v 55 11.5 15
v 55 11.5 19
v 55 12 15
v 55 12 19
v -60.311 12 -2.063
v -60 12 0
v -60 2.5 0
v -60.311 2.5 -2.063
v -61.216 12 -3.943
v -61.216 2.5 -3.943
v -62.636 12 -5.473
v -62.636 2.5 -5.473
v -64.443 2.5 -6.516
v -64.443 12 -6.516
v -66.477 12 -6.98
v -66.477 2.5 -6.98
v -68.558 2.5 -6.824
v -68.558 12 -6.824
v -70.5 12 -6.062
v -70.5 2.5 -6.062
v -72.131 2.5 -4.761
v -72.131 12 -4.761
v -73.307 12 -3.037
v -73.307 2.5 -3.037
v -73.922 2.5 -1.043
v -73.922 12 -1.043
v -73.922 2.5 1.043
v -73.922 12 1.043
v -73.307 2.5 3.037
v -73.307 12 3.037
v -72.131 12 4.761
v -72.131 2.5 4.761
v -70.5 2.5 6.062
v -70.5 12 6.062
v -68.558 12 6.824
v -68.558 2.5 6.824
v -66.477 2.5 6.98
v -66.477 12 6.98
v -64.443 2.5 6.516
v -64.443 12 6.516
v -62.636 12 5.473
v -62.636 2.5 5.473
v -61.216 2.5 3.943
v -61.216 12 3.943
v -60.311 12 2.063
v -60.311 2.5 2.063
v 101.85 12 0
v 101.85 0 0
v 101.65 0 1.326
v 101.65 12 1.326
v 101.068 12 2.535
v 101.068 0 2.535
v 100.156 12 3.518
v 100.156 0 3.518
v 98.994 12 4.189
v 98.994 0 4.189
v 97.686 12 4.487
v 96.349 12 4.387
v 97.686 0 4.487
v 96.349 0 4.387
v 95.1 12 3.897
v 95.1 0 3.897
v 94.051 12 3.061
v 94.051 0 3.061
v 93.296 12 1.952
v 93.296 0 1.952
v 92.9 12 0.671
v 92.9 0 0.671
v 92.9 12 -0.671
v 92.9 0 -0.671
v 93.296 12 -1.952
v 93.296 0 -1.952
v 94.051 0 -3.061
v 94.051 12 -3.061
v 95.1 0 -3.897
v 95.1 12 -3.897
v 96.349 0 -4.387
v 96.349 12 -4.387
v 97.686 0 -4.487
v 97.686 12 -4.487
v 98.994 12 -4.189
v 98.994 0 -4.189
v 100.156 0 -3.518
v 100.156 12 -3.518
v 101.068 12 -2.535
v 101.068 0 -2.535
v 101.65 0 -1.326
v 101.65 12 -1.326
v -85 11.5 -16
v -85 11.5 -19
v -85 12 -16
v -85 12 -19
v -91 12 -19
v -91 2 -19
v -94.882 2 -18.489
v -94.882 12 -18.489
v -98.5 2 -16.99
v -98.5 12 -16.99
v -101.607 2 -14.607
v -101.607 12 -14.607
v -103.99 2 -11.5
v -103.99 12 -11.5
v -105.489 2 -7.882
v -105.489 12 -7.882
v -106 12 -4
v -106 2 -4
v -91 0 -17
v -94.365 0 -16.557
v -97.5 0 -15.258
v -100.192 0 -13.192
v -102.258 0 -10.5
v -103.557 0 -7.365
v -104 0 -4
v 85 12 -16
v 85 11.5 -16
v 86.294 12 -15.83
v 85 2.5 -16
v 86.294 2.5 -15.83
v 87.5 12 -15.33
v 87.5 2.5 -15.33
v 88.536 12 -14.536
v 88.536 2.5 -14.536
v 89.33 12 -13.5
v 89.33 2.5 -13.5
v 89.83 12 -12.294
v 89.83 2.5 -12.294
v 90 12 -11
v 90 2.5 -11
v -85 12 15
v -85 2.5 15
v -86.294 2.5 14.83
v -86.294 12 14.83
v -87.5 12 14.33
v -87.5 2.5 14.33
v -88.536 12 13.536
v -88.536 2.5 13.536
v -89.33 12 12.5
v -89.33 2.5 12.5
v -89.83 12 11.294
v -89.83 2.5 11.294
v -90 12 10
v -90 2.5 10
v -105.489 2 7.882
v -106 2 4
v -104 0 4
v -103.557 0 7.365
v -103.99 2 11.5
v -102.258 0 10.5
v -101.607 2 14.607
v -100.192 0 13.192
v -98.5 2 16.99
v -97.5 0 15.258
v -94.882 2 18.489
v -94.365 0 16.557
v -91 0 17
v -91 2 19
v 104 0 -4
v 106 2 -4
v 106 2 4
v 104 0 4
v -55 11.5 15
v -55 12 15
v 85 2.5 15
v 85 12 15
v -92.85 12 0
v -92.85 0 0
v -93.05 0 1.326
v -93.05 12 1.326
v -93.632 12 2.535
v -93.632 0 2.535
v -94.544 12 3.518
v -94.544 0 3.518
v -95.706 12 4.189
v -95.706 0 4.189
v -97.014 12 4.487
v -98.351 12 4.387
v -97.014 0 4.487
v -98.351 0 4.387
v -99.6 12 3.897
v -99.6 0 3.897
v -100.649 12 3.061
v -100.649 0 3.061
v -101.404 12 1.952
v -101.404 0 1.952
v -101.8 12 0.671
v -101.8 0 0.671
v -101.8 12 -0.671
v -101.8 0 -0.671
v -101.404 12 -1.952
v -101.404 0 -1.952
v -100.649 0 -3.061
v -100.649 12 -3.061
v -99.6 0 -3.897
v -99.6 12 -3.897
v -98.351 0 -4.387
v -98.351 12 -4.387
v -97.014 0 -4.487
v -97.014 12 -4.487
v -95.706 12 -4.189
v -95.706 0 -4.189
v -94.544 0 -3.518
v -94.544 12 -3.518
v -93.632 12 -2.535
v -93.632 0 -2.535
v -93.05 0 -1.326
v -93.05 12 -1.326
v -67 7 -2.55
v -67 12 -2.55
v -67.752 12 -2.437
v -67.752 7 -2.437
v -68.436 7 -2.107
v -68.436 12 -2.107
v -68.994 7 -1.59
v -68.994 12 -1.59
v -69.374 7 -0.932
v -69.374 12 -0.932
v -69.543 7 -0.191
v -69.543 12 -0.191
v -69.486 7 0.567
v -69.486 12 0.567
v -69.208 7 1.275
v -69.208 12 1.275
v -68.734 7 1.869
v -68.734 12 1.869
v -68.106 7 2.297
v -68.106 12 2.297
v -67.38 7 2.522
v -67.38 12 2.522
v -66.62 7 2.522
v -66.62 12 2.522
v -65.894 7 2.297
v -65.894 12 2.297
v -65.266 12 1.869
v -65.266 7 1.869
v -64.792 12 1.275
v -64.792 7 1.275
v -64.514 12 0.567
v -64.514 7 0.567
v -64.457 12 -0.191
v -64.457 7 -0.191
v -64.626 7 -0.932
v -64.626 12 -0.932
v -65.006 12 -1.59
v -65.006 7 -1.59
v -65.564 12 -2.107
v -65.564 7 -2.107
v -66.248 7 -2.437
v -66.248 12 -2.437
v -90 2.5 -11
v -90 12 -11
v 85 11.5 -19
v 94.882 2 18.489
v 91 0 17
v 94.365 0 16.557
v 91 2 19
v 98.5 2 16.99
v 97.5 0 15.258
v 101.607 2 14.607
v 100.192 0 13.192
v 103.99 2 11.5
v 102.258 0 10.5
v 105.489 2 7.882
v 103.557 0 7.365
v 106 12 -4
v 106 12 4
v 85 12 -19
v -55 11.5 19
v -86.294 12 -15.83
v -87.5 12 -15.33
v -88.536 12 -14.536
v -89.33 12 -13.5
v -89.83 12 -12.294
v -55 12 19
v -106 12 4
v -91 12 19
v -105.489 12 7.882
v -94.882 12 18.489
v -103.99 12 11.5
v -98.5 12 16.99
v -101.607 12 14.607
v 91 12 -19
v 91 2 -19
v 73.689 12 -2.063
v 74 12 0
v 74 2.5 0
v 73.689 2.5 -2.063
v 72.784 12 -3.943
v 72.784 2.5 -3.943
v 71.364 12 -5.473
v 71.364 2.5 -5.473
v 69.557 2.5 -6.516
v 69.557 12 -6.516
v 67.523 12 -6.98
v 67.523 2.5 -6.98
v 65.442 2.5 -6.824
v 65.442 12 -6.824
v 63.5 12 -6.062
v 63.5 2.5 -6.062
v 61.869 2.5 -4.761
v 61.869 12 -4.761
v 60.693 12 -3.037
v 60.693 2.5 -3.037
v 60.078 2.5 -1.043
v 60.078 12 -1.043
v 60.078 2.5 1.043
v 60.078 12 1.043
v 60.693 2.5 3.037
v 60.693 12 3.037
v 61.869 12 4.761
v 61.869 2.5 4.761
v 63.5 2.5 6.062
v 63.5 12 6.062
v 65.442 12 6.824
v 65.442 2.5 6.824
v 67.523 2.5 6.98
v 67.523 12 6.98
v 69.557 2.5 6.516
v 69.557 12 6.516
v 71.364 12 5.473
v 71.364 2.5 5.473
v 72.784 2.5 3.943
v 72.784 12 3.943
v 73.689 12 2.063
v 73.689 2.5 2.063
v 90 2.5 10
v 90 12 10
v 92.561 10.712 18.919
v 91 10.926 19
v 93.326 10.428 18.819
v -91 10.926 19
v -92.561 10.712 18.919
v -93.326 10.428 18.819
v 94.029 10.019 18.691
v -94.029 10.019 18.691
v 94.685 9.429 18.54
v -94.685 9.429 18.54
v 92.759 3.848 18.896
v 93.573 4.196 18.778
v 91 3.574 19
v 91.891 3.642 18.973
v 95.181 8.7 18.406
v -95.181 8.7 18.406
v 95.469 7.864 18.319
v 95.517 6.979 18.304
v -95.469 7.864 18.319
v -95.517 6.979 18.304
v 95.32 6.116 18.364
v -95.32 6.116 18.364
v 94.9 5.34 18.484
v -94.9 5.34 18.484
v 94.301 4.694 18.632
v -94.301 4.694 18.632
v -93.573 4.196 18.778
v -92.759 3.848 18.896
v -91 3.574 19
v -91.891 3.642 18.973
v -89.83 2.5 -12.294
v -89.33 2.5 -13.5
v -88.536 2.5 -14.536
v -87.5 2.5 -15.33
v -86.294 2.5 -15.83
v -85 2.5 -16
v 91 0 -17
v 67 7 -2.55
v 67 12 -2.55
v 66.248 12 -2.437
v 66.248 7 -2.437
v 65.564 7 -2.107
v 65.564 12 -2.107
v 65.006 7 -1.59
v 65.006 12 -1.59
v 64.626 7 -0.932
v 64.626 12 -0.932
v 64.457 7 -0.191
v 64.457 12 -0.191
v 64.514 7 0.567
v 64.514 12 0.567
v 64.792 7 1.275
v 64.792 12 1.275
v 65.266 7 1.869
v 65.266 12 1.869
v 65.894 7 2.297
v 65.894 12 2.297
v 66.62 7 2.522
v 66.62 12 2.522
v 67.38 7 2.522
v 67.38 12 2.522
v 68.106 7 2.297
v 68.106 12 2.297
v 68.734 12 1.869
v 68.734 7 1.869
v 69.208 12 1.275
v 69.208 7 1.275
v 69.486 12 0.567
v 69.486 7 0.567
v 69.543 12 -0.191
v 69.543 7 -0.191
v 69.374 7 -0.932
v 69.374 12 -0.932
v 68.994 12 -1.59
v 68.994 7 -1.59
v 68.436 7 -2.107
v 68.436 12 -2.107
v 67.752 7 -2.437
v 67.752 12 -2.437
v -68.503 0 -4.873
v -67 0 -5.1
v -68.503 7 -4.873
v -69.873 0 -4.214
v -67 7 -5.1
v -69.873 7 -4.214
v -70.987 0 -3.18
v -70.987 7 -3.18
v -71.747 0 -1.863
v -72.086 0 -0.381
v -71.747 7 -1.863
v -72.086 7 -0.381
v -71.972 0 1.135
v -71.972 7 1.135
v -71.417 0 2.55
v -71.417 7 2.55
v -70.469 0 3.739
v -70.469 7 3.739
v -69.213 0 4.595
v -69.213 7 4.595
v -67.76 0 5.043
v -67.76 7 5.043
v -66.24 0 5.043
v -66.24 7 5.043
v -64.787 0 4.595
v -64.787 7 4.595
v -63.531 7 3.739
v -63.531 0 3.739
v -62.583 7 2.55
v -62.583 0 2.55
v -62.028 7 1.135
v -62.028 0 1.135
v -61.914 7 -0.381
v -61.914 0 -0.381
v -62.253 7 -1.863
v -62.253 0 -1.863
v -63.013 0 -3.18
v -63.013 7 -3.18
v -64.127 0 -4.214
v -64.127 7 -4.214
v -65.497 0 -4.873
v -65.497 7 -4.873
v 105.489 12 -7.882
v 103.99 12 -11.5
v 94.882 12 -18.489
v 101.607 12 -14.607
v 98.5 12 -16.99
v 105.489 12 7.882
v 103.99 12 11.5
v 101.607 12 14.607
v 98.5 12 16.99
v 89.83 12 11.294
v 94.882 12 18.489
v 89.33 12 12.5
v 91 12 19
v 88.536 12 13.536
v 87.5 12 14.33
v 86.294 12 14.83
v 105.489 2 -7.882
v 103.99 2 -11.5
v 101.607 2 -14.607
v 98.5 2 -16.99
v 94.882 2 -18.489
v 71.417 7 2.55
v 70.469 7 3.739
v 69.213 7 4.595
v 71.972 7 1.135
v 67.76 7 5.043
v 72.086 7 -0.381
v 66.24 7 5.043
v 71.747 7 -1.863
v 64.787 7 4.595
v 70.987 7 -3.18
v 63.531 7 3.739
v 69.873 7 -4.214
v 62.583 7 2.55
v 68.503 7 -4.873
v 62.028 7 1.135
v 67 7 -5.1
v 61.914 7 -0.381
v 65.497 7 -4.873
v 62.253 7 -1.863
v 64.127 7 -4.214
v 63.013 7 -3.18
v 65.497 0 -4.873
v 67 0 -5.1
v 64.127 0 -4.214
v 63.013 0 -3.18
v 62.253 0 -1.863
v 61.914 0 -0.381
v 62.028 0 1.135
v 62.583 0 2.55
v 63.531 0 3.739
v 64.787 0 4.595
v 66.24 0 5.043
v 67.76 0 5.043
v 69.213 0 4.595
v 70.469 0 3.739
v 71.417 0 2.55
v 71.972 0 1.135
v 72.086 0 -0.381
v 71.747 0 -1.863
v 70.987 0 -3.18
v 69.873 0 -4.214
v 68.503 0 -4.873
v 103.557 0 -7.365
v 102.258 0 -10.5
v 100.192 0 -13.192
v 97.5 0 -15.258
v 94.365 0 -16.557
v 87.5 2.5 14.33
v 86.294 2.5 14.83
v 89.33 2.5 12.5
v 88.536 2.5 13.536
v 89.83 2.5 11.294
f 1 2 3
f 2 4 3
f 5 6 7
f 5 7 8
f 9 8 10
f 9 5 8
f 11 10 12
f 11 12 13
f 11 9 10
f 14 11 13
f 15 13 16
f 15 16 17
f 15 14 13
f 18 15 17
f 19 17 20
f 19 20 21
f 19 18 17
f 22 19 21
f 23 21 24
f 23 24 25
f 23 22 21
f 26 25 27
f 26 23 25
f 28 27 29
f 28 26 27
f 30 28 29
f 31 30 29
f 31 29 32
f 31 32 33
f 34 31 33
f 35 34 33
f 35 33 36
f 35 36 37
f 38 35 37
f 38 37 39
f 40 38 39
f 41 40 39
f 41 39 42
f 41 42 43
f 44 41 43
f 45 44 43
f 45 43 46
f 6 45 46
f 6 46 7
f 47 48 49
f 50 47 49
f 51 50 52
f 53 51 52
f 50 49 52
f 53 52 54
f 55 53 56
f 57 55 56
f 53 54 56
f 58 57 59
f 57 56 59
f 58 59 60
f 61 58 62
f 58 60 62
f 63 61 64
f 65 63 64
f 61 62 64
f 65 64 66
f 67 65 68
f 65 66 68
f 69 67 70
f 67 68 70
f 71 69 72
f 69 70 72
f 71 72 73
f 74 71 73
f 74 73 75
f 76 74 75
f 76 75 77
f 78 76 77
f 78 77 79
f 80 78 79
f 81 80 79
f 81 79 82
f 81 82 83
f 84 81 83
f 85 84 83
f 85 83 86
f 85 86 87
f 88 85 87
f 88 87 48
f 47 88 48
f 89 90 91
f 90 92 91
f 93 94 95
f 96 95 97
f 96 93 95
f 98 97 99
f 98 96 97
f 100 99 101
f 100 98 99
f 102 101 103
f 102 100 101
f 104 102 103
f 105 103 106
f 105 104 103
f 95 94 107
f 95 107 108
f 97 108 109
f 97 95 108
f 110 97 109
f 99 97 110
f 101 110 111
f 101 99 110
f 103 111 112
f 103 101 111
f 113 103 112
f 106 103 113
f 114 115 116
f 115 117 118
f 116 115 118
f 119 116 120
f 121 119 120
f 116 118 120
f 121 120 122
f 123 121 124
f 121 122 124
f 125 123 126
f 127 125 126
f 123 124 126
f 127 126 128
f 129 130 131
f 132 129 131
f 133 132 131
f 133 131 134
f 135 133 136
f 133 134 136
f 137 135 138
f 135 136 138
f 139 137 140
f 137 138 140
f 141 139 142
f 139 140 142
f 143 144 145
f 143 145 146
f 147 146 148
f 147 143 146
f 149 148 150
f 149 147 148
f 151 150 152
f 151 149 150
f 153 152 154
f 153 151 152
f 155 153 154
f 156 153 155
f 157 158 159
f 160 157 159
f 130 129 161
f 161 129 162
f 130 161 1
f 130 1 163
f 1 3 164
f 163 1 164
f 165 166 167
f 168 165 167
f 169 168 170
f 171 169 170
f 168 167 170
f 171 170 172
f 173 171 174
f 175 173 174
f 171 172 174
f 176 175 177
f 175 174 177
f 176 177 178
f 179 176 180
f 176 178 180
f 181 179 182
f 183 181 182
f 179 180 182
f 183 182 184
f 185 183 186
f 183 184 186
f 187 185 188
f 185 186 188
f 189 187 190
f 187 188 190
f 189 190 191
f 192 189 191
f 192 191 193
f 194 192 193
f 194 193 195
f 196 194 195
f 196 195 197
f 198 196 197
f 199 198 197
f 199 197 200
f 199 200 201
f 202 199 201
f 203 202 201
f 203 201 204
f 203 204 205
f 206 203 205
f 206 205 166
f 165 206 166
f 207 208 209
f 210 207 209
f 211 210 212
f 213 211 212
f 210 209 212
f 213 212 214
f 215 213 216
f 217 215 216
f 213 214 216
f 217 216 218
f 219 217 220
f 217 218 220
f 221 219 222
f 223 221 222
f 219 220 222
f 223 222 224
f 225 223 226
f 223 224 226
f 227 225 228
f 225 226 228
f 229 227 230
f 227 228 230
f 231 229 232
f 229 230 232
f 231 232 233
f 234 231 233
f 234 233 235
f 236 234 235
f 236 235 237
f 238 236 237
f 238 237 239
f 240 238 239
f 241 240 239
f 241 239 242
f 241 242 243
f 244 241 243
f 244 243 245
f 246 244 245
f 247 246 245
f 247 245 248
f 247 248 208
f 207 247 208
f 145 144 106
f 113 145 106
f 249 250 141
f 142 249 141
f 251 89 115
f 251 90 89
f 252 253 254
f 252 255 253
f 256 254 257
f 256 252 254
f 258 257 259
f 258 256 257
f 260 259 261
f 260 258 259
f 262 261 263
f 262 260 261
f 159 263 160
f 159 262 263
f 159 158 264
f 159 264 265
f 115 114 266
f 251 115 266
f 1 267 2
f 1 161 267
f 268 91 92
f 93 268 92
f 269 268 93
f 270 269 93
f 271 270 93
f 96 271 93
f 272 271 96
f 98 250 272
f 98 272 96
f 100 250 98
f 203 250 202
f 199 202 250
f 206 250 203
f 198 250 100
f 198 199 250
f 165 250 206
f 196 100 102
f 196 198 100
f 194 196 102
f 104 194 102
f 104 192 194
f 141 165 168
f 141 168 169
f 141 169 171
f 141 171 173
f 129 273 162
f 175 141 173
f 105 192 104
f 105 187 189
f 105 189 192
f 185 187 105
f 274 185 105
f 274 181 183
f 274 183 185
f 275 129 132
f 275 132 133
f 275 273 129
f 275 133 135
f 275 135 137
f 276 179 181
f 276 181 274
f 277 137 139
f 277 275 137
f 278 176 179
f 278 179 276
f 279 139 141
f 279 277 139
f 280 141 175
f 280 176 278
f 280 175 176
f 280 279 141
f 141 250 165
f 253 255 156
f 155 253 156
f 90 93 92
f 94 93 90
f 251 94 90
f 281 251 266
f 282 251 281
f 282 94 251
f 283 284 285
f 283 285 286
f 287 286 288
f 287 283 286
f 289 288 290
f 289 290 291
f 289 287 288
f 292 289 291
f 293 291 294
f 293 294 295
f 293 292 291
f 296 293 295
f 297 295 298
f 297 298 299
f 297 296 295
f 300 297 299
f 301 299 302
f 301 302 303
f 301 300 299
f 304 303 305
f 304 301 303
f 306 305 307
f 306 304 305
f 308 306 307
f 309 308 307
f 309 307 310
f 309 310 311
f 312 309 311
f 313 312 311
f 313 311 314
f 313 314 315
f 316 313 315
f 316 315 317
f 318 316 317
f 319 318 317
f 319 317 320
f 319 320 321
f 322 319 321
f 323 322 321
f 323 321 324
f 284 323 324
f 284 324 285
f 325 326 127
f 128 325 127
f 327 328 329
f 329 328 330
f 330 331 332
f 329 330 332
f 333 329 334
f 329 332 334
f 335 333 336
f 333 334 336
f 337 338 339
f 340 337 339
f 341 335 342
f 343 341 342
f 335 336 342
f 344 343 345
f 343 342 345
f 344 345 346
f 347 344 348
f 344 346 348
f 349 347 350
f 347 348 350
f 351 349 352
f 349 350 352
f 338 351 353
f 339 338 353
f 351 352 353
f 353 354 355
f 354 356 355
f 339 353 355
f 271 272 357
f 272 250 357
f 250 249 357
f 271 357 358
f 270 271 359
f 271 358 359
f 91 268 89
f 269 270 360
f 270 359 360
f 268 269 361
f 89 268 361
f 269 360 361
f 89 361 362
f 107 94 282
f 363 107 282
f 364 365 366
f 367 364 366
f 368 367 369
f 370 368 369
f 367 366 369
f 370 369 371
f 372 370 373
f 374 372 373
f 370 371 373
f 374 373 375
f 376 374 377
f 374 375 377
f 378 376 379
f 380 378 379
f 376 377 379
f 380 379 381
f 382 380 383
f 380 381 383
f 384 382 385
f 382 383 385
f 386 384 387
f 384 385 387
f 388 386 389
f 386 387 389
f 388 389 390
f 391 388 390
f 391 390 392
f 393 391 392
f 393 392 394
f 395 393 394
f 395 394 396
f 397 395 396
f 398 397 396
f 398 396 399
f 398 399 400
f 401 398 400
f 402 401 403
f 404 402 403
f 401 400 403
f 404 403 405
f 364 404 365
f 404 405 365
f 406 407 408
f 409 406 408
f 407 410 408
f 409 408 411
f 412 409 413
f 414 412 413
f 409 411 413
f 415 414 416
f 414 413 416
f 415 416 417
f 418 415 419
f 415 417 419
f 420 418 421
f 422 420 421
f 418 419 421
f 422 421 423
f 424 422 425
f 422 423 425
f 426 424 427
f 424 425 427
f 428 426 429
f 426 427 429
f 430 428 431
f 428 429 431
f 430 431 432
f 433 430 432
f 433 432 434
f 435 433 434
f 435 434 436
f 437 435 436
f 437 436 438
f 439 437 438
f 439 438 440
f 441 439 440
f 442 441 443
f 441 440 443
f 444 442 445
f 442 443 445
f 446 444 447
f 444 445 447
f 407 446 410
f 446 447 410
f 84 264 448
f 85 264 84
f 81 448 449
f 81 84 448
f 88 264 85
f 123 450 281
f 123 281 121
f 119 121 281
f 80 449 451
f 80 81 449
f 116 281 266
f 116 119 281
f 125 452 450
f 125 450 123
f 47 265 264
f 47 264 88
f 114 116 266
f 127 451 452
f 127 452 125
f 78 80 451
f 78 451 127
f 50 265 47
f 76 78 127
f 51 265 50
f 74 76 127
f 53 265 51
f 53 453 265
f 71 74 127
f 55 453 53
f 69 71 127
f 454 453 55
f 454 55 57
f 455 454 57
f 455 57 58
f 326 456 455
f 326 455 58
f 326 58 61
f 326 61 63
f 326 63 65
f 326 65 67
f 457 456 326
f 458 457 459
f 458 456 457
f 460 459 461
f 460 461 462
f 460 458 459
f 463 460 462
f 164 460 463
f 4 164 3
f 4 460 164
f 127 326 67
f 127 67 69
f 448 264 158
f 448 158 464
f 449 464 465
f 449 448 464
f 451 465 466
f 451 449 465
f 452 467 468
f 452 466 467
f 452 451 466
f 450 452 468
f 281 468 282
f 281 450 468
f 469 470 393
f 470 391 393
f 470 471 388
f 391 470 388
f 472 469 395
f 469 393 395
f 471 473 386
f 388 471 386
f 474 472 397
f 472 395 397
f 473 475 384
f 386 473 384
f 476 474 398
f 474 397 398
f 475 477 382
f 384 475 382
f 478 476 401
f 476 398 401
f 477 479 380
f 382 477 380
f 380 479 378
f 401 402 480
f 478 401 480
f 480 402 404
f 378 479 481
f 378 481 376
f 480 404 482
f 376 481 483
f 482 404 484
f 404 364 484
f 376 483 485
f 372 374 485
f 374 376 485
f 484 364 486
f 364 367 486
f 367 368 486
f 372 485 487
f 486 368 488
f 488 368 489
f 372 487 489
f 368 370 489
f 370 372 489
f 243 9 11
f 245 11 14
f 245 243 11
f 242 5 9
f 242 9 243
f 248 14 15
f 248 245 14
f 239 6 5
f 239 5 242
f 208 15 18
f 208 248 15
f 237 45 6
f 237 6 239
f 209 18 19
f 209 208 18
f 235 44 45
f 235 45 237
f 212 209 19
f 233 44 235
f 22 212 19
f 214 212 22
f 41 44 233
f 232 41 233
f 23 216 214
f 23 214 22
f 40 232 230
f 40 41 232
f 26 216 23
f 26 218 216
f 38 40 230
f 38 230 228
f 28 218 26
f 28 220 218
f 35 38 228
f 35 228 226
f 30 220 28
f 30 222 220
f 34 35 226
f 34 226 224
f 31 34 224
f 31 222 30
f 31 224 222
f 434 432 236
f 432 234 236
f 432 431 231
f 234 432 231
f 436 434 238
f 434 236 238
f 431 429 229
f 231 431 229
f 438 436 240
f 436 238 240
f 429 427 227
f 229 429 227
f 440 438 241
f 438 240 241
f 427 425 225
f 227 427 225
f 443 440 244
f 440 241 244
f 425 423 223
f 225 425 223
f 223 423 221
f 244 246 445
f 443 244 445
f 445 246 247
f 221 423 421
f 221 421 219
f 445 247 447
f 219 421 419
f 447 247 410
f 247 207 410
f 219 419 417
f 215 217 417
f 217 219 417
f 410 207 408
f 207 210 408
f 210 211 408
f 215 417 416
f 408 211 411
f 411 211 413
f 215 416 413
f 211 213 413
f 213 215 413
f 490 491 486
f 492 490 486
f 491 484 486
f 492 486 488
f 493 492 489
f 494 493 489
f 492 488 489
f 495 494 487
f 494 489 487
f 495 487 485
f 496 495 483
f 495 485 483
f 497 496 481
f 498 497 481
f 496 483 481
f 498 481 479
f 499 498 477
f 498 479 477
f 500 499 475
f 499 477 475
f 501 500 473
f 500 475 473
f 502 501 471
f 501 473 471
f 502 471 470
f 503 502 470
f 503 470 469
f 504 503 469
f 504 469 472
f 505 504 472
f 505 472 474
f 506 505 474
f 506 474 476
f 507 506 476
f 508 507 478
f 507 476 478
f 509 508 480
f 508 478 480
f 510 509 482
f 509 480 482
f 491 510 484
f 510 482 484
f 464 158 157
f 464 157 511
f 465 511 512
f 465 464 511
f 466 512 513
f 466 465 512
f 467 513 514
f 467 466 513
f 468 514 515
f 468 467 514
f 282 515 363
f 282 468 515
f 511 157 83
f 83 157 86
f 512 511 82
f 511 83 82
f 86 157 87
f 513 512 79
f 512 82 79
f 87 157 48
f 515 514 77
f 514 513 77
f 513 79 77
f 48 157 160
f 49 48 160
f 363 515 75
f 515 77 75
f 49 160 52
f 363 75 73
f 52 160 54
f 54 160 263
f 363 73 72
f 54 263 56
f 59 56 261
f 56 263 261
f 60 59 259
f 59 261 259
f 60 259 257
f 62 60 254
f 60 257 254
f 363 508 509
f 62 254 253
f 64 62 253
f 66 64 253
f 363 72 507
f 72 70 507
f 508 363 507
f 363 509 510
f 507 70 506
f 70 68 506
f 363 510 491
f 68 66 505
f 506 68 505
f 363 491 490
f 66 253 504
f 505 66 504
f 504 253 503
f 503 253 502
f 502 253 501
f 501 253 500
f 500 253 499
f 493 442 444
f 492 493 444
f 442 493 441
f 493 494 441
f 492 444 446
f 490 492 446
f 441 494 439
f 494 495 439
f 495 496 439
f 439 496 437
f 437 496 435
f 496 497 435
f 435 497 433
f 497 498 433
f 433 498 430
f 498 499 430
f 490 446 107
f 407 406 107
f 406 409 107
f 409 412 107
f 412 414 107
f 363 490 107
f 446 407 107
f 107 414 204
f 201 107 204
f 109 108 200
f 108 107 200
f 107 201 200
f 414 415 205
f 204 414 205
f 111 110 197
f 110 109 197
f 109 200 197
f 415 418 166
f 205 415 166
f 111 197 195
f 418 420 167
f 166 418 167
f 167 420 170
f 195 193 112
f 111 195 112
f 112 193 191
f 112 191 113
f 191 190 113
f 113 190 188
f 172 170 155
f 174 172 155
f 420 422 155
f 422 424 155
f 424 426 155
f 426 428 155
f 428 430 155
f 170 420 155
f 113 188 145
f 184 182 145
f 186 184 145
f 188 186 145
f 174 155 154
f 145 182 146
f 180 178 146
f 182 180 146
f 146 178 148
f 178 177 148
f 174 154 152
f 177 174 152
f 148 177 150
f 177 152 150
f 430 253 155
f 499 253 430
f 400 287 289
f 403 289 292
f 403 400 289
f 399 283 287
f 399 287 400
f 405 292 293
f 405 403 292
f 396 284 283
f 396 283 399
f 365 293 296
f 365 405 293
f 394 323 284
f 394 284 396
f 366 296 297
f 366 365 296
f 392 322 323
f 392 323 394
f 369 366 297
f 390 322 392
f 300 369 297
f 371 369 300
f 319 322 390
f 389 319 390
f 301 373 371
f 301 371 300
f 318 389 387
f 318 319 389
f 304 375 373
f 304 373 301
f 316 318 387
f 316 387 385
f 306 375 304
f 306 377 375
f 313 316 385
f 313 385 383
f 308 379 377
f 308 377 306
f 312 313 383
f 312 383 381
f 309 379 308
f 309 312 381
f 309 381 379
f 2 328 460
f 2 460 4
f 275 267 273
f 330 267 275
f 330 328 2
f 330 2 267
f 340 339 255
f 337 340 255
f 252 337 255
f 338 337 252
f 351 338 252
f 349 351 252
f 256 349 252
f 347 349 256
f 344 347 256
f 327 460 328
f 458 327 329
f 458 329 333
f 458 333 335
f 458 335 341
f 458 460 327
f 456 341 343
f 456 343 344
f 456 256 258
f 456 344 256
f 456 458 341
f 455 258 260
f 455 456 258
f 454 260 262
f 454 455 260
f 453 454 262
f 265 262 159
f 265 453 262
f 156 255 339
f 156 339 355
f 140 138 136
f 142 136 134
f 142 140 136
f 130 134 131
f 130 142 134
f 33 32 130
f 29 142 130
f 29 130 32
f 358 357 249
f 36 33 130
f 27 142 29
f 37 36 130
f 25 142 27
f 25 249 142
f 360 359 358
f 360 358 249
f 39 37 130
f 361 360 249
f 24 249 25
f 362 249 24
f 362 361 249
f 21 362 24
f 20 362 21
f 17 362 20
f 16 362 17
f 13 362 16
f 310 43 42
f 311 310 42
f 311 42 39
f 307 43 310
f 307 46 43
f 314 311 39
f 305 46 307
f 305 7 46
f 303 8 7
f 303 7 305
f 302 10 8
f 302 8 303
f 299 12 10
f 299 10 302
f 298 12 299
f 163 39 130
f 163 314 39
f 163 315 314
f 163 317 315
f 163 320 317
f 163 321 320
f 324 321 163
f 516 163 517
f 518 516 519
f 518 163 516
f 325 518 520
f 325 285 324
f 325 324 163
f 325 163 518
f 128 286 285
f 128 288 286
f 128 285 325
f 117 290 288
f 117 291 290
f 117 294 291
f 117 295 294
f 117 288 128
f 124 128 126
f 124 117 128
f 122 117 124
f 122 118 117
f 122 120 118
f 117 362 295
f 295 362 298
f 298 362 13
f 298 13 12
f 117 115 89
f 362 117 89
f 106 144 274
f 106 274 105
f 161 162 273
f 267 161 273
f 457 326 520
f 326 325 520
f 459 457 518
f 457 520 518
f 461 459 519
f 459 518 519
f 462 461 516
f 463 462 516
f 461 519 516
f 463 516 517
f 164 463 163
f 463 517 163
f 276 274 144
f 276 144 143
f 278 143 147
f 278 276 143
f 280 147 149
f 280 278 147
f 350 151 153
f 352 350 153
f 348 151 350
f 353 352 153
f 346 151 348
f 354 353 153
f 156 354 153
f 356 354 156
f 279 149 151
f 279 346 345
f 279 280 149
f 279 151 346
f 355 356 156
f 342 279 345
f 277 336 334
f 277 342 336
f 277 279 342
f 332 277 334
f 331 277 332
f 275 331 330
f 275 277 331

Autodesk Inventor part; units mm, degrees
ref_plane "YZ Plane" through (0, 0, 0) normal (1, 0, 0) x (0, 1, 0)
ref_plane "XZ Plane" through (0, 0, 0) normal (0, 1, 0) x (-1, 0, 0)
ref_plane "XY Plane" through (0, 0, 0) normal (0, 0, 1) x (1, 0, 0)
sketch "Body Outline" plane through (0, 0, 0) normal (0, 1, 0) x (-1, 0, 0)
  line L0 (106, -19) -> (-106, -19)
  line L1 (-106, -19) -> (-106, 19)
  line L2 (-106, 19) -> (106, 19)
  line L3 (106, 19) -> (106, -19)
  point P0 (0, 0)
  dimension "d0" = 38
  dimension "d1" = 19
  dimension "d2" = 212
  dimension "d3" = 106
extrude "Body" add sketch "Body Outline" along normal blind 12
sketch "Body Cutout Outline" plane through (0, 12, 0) normal (0, 1, 0) x (1, 0, 0)
  line L0 (-90, -15) -> (90, -15)
  line L1 (90, -15) -> (90, 16)
  line L2 (90, 16) -> (-90, 16)
  line L3 (-90, 16) -> (-90, -15)
  circle A0 centre (-67, 0) radius 7
  circle A1 centre (67, 0) radius 7
  line L4 (-106, -19) -> (106, -19) projected
  point P0 (0, 0)
  dimension "d6" = 31
  dimension "d8" = 180
  dimension "d9" = 90
  dimension "d12" = 14
  dimension "d13" = 14
  dimension "d14" = 0
  dimension "d15" = 67
  dimension "d16" = 67
  dimension "d17" = 0
  dimension "d68" = 4
extrude "Body Cutout" cut sketch "Body Cutout Outline" against normal blind 9.5
sketch "Skin Passages Outline" plane through (0, 12, 0) normal (0, 1, 0) x (1, 0, 0)
  line L0 (-85, 16) -> (85, 16)
  line L1 (85, 16) -> (85, 19)
  line L2 (85, 19) -> (-85, 19)
  line L3 (-85, 19) -> (-85, 16)
  line L4 (106, 19) -> (-106, 19) projected
  line L5 (-55, -19) -> (55, -19)
  line L6 (55, -19) -> (55, -15)
  line L7 (55, -15) -> (-55, -15)
  line L8 (-55, -15) -> (-55, -19)
  line L9 (-106, -19) -> (106, -19) projected
  point P0 (0, 0)
  dimension "d20" = 0
  dimension "d21" = 3
  dimension "d22" = 170
  dimension "d23" = 85
  dimension "d24" = 0
  dimension "d25" = 4
  dimension "d26" = 110
  dimension "d27" = 55
extrude "Skin Passages" cut sketch "Skin Passages Outline" against normal blind 0.5
sketch "Fastening Hole Positions" plane through (0, 0, 0) normal (0, -1, 0) x (1, 0, 0)
  point P0 (0, 0)
  point P1 (67, 0)
  point P2 (-67, 0)
  dimension "d30" = 67
  dimension "d31" = 67
  dimension "d32" = 0
  dimension "d33" = 0
hole "Fastening Holes" at (67, 0, 0) at (-67, 0, 0) direction (0, 1, 0) diameter 5.1 end through all counterbore diameter 10.2 counterbore depth 7
sketch "Thumbscrew Hole Positions" plane through (0, 0, 0) normal (0, -1, 0) x (1, 0, 0)
  circle A0 centre (-97.35, 0) radius 4.5
  circle A1 centre (97.35, 0) radius 4.5
  line L0 (106, -19) -> (106, 19) projected
  line L1 (-106, 19) -> (-106, -19) projected
  point P0 (0, 0)
  dimension "d44" = 9
  dimension "d45" = 9
  dimension "d47" = 0
  dimension "d49" = 0
  dimension "d66" = 8.65
  dimension "d67" = 8.65
extrude "Thumbscrew Holes" cut sketch "Thumbscrew Hole Positions" along normal through all both and the other way through all
sketch "Side Cutout Outline" plane through (-106, 0, -19) normal (-1, 0, 0) x (0, 0, 1)
  circle A0 centre (47.3, 7.25) radius 10
  line L0 (38, 0) -> (38, 12) projected
  line L1 (0, 12) -> (38, 12) projected
  point P0 (19, 0)
  dimension "d69" = 20
  dimension "d70" = 9.3
  dimension "d71" = 4.75
extrude "Side Cutout" cut sketch "Side Cutout Outline" along normal through all both and the other way through all
fillet "Body Fillet" radius 5 4 edges at (-90, 7.25, -16) (90, 7.25, -16) (90, 7.25, 15) (-90, 7.25, 15)
fillet "Body Fillet" radius 15 4 edges at (-106, 1.7872, 19) (-106, 6, -19) (106, 6, -19) (106, 1.7872, 19)
chamfer "Body Chamfer" distance 2 angle 45 4 edges at (0, 0, 19) (106, 0, 0) (0, 0, -19) (-106, 0, 0)
equation "\"d1\" = 0.5 * d0"
equation "\"d3\" = 0.5 * d2"
equation "\"d9\" = 0.5 * d8"
equation "\"d16\" = d15"
equation "\"d23\" = 0.5 * d22"
equation "\"d27\" = 0.5 * d26"
properties part number "LR Top Cover Studs End" material "Acetal Resin, Black"
